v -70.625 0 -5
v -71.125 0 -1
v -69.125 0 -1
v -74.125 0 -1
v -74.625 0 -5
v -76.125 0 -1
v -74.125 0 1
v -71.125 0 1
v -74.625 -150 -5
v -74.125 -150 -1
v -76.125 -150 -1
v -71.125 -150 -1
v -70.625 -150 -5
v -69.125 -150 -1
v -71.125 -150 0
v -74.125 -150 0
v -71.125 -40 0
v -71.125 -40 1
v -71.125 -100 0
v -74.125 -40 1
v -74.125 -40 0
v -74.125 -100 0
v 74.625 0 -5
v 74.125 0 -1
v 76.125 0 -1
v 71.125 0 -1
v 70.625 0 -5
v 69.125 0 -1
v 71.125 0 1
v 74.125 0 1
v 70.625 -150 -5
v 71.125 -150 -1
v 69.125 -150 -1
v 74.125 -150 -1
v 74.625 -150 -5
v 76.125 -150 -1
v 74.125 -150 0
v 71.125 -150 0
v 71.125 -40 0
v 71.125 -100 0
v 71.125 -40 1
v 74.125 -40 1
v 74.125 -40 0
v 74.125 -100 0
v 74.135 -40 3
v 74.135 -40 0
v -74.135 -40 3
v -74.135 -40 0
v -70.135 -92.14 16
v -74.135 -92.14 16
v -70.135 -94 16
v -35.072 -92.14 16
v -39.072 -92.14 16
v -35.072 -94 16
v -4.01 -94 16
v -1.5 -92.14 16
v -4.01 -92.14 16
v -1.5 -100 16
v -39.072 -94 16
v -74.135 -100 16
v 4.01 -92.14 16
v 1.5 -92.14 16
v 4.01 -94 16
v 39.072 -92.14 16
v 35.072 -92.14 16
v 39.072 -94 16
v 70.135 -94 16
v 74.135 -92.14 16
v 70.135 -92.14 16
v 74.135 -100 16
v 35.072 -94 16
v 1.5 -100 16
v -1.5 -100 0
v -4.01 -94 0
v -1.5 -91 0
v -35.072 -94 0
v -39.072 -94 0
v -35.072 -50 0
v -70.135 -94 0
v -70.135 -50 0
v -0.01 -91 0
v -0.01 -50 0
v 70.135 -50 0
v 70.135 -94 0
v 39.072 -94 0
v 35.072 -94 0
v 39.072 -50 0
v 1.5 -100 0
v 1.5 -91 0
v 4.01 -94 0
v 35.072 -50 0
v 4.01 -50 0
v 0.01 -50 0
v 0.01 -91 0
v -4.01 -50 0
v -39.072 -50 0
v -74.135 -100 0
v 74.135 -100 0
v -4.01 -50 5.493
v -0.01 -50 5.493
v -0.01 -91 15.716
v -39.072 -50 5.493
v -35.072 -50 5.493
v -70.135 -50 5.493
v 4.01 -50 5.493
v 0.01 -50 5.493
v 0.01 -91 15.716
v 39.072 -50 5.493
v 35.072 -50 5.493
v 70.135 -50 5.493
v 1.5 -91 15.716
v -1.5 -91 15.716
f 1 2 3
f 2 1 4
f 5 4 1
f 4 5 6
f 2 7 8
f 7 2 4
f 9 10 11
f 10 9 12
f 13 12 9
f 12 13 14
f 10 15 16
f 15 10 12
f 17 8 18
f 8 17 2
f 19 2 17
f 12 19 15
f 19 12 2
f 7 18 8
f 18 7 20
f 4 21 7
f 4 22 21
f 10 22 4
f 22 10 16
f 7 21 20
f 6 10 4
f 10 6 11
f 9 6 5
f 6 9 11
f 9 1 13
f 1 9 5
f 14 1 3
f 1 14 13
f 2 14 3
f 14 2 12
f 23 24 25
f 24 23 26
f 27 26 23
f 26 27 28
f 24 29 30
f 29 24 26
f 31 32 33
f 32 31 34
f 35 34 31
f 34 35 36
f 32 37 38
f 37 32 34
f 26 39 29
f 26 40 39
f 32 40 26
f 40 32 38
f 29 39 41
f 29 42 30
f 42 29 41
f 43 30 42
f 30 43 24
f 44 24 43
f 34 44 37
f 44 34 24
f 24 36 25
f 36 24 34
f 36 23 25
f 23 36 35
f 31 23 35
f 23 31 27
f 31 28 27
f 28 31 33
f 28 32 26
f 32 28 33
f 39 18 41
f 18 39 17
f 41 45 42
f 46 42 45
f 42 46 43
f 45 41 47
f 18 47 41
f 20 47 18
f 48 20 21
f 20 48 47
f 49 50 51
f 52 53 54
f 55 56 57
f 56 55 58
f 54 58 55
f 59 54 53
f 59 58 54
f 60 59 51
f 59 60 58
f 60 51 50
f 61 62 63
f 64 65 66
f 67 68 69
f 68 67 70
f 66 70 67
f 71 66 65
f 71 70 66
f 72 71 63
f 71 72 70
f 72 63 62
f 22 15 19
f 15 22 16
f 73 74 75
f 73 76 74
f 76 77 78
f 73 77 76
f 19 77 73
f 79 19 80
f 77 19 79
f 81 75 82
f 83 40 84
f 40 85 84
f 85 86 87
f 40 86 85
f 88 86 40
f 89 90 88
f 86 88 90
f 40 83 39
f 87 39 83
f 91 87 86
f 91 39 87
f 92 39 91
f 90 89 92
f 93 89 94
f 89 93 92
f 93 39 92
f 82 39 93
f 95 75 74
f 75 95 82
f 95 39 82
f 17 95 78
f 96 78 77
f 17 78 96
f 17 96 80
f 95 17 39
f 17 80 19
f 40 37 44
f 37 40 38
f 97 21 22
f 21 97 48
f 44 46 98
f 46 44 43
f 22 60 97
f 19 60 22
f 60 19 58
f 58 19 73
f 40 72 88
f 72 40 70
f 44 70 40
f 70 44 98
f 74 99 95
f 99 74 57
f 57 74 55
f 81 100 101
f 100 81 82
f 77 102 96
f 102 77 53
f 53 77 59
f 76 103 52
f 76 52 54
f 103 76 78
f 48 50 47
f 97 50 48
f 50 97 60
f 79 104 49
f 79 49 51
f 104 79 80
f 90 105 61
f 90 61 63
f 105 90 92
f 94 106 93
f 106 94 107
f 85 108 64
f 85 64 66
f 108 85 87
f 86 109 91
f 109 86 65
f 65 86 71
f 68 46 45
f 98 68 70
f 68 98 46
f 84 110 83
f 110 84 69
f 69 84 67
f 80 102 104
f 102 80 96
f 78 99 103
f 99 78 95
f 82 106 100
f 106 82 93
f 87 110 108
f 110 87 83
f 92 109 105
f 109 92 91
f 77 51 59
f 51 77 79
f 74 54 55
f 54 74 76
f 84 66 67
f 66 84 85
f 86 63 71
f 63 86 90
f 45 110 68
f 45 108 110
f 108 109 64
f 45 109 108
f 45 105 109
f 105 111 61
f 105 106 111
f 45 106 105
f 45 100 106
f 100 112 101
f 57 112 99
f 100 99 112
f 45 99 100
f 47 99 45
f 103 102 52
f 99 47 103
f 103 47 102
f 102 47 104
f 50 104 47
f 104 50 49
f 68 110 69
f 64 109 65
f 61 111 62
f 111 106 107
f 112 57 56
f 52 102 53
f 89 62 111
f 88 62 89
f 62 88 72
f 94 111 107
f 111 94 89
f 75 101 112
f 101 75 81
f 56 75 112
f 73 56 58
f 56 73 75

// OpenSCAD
// 141.06 mm separation
sep = 142.25;
length = 150;


difference() {

rotate([0,0,90])
  union() {
    for (s = [0:1])
    mirror([0,s*1,0])
    translate([0,sep/2-2,-1])
    rotate([0,-90,0])
    linear_extrude(length)
    polygon([
      [0,0],[0,2],[2,2],[2,5],[0,5],[0,7],[-4,5.5],[-4,1.5],[0,0]
    ]);
    
    translate([-50,-(sep+6)/2,0])
    cube([10,sep+6,6]);

    translate([-100,-(sep+6)/2,0])
    cube([6,sep+6,16]);

    for (s = [0:1])
    mirror([0,s*1,0])
    translate([-100,.01,0])
    for (i = [0:2])
    translate([0,i*((sep-2)/4),0])
    cube([60,4,16]);

  }

  union() {
    translate([0,-40,3])
    rotate([76,0,0])
    for (s = [0:1])
    mirror([s*1,0,0])
    cube([80,20,70]);

    translate([0,-200,0])
    for (s = [0:1])
    mirror([s*1,0,0])
    cube([80,100,70]);

    #
    translate([0,-101,0])
    for (s = [0:1])
    mirror([s*1,0,0])
    cube([1.5,10,30]);

  }



}
